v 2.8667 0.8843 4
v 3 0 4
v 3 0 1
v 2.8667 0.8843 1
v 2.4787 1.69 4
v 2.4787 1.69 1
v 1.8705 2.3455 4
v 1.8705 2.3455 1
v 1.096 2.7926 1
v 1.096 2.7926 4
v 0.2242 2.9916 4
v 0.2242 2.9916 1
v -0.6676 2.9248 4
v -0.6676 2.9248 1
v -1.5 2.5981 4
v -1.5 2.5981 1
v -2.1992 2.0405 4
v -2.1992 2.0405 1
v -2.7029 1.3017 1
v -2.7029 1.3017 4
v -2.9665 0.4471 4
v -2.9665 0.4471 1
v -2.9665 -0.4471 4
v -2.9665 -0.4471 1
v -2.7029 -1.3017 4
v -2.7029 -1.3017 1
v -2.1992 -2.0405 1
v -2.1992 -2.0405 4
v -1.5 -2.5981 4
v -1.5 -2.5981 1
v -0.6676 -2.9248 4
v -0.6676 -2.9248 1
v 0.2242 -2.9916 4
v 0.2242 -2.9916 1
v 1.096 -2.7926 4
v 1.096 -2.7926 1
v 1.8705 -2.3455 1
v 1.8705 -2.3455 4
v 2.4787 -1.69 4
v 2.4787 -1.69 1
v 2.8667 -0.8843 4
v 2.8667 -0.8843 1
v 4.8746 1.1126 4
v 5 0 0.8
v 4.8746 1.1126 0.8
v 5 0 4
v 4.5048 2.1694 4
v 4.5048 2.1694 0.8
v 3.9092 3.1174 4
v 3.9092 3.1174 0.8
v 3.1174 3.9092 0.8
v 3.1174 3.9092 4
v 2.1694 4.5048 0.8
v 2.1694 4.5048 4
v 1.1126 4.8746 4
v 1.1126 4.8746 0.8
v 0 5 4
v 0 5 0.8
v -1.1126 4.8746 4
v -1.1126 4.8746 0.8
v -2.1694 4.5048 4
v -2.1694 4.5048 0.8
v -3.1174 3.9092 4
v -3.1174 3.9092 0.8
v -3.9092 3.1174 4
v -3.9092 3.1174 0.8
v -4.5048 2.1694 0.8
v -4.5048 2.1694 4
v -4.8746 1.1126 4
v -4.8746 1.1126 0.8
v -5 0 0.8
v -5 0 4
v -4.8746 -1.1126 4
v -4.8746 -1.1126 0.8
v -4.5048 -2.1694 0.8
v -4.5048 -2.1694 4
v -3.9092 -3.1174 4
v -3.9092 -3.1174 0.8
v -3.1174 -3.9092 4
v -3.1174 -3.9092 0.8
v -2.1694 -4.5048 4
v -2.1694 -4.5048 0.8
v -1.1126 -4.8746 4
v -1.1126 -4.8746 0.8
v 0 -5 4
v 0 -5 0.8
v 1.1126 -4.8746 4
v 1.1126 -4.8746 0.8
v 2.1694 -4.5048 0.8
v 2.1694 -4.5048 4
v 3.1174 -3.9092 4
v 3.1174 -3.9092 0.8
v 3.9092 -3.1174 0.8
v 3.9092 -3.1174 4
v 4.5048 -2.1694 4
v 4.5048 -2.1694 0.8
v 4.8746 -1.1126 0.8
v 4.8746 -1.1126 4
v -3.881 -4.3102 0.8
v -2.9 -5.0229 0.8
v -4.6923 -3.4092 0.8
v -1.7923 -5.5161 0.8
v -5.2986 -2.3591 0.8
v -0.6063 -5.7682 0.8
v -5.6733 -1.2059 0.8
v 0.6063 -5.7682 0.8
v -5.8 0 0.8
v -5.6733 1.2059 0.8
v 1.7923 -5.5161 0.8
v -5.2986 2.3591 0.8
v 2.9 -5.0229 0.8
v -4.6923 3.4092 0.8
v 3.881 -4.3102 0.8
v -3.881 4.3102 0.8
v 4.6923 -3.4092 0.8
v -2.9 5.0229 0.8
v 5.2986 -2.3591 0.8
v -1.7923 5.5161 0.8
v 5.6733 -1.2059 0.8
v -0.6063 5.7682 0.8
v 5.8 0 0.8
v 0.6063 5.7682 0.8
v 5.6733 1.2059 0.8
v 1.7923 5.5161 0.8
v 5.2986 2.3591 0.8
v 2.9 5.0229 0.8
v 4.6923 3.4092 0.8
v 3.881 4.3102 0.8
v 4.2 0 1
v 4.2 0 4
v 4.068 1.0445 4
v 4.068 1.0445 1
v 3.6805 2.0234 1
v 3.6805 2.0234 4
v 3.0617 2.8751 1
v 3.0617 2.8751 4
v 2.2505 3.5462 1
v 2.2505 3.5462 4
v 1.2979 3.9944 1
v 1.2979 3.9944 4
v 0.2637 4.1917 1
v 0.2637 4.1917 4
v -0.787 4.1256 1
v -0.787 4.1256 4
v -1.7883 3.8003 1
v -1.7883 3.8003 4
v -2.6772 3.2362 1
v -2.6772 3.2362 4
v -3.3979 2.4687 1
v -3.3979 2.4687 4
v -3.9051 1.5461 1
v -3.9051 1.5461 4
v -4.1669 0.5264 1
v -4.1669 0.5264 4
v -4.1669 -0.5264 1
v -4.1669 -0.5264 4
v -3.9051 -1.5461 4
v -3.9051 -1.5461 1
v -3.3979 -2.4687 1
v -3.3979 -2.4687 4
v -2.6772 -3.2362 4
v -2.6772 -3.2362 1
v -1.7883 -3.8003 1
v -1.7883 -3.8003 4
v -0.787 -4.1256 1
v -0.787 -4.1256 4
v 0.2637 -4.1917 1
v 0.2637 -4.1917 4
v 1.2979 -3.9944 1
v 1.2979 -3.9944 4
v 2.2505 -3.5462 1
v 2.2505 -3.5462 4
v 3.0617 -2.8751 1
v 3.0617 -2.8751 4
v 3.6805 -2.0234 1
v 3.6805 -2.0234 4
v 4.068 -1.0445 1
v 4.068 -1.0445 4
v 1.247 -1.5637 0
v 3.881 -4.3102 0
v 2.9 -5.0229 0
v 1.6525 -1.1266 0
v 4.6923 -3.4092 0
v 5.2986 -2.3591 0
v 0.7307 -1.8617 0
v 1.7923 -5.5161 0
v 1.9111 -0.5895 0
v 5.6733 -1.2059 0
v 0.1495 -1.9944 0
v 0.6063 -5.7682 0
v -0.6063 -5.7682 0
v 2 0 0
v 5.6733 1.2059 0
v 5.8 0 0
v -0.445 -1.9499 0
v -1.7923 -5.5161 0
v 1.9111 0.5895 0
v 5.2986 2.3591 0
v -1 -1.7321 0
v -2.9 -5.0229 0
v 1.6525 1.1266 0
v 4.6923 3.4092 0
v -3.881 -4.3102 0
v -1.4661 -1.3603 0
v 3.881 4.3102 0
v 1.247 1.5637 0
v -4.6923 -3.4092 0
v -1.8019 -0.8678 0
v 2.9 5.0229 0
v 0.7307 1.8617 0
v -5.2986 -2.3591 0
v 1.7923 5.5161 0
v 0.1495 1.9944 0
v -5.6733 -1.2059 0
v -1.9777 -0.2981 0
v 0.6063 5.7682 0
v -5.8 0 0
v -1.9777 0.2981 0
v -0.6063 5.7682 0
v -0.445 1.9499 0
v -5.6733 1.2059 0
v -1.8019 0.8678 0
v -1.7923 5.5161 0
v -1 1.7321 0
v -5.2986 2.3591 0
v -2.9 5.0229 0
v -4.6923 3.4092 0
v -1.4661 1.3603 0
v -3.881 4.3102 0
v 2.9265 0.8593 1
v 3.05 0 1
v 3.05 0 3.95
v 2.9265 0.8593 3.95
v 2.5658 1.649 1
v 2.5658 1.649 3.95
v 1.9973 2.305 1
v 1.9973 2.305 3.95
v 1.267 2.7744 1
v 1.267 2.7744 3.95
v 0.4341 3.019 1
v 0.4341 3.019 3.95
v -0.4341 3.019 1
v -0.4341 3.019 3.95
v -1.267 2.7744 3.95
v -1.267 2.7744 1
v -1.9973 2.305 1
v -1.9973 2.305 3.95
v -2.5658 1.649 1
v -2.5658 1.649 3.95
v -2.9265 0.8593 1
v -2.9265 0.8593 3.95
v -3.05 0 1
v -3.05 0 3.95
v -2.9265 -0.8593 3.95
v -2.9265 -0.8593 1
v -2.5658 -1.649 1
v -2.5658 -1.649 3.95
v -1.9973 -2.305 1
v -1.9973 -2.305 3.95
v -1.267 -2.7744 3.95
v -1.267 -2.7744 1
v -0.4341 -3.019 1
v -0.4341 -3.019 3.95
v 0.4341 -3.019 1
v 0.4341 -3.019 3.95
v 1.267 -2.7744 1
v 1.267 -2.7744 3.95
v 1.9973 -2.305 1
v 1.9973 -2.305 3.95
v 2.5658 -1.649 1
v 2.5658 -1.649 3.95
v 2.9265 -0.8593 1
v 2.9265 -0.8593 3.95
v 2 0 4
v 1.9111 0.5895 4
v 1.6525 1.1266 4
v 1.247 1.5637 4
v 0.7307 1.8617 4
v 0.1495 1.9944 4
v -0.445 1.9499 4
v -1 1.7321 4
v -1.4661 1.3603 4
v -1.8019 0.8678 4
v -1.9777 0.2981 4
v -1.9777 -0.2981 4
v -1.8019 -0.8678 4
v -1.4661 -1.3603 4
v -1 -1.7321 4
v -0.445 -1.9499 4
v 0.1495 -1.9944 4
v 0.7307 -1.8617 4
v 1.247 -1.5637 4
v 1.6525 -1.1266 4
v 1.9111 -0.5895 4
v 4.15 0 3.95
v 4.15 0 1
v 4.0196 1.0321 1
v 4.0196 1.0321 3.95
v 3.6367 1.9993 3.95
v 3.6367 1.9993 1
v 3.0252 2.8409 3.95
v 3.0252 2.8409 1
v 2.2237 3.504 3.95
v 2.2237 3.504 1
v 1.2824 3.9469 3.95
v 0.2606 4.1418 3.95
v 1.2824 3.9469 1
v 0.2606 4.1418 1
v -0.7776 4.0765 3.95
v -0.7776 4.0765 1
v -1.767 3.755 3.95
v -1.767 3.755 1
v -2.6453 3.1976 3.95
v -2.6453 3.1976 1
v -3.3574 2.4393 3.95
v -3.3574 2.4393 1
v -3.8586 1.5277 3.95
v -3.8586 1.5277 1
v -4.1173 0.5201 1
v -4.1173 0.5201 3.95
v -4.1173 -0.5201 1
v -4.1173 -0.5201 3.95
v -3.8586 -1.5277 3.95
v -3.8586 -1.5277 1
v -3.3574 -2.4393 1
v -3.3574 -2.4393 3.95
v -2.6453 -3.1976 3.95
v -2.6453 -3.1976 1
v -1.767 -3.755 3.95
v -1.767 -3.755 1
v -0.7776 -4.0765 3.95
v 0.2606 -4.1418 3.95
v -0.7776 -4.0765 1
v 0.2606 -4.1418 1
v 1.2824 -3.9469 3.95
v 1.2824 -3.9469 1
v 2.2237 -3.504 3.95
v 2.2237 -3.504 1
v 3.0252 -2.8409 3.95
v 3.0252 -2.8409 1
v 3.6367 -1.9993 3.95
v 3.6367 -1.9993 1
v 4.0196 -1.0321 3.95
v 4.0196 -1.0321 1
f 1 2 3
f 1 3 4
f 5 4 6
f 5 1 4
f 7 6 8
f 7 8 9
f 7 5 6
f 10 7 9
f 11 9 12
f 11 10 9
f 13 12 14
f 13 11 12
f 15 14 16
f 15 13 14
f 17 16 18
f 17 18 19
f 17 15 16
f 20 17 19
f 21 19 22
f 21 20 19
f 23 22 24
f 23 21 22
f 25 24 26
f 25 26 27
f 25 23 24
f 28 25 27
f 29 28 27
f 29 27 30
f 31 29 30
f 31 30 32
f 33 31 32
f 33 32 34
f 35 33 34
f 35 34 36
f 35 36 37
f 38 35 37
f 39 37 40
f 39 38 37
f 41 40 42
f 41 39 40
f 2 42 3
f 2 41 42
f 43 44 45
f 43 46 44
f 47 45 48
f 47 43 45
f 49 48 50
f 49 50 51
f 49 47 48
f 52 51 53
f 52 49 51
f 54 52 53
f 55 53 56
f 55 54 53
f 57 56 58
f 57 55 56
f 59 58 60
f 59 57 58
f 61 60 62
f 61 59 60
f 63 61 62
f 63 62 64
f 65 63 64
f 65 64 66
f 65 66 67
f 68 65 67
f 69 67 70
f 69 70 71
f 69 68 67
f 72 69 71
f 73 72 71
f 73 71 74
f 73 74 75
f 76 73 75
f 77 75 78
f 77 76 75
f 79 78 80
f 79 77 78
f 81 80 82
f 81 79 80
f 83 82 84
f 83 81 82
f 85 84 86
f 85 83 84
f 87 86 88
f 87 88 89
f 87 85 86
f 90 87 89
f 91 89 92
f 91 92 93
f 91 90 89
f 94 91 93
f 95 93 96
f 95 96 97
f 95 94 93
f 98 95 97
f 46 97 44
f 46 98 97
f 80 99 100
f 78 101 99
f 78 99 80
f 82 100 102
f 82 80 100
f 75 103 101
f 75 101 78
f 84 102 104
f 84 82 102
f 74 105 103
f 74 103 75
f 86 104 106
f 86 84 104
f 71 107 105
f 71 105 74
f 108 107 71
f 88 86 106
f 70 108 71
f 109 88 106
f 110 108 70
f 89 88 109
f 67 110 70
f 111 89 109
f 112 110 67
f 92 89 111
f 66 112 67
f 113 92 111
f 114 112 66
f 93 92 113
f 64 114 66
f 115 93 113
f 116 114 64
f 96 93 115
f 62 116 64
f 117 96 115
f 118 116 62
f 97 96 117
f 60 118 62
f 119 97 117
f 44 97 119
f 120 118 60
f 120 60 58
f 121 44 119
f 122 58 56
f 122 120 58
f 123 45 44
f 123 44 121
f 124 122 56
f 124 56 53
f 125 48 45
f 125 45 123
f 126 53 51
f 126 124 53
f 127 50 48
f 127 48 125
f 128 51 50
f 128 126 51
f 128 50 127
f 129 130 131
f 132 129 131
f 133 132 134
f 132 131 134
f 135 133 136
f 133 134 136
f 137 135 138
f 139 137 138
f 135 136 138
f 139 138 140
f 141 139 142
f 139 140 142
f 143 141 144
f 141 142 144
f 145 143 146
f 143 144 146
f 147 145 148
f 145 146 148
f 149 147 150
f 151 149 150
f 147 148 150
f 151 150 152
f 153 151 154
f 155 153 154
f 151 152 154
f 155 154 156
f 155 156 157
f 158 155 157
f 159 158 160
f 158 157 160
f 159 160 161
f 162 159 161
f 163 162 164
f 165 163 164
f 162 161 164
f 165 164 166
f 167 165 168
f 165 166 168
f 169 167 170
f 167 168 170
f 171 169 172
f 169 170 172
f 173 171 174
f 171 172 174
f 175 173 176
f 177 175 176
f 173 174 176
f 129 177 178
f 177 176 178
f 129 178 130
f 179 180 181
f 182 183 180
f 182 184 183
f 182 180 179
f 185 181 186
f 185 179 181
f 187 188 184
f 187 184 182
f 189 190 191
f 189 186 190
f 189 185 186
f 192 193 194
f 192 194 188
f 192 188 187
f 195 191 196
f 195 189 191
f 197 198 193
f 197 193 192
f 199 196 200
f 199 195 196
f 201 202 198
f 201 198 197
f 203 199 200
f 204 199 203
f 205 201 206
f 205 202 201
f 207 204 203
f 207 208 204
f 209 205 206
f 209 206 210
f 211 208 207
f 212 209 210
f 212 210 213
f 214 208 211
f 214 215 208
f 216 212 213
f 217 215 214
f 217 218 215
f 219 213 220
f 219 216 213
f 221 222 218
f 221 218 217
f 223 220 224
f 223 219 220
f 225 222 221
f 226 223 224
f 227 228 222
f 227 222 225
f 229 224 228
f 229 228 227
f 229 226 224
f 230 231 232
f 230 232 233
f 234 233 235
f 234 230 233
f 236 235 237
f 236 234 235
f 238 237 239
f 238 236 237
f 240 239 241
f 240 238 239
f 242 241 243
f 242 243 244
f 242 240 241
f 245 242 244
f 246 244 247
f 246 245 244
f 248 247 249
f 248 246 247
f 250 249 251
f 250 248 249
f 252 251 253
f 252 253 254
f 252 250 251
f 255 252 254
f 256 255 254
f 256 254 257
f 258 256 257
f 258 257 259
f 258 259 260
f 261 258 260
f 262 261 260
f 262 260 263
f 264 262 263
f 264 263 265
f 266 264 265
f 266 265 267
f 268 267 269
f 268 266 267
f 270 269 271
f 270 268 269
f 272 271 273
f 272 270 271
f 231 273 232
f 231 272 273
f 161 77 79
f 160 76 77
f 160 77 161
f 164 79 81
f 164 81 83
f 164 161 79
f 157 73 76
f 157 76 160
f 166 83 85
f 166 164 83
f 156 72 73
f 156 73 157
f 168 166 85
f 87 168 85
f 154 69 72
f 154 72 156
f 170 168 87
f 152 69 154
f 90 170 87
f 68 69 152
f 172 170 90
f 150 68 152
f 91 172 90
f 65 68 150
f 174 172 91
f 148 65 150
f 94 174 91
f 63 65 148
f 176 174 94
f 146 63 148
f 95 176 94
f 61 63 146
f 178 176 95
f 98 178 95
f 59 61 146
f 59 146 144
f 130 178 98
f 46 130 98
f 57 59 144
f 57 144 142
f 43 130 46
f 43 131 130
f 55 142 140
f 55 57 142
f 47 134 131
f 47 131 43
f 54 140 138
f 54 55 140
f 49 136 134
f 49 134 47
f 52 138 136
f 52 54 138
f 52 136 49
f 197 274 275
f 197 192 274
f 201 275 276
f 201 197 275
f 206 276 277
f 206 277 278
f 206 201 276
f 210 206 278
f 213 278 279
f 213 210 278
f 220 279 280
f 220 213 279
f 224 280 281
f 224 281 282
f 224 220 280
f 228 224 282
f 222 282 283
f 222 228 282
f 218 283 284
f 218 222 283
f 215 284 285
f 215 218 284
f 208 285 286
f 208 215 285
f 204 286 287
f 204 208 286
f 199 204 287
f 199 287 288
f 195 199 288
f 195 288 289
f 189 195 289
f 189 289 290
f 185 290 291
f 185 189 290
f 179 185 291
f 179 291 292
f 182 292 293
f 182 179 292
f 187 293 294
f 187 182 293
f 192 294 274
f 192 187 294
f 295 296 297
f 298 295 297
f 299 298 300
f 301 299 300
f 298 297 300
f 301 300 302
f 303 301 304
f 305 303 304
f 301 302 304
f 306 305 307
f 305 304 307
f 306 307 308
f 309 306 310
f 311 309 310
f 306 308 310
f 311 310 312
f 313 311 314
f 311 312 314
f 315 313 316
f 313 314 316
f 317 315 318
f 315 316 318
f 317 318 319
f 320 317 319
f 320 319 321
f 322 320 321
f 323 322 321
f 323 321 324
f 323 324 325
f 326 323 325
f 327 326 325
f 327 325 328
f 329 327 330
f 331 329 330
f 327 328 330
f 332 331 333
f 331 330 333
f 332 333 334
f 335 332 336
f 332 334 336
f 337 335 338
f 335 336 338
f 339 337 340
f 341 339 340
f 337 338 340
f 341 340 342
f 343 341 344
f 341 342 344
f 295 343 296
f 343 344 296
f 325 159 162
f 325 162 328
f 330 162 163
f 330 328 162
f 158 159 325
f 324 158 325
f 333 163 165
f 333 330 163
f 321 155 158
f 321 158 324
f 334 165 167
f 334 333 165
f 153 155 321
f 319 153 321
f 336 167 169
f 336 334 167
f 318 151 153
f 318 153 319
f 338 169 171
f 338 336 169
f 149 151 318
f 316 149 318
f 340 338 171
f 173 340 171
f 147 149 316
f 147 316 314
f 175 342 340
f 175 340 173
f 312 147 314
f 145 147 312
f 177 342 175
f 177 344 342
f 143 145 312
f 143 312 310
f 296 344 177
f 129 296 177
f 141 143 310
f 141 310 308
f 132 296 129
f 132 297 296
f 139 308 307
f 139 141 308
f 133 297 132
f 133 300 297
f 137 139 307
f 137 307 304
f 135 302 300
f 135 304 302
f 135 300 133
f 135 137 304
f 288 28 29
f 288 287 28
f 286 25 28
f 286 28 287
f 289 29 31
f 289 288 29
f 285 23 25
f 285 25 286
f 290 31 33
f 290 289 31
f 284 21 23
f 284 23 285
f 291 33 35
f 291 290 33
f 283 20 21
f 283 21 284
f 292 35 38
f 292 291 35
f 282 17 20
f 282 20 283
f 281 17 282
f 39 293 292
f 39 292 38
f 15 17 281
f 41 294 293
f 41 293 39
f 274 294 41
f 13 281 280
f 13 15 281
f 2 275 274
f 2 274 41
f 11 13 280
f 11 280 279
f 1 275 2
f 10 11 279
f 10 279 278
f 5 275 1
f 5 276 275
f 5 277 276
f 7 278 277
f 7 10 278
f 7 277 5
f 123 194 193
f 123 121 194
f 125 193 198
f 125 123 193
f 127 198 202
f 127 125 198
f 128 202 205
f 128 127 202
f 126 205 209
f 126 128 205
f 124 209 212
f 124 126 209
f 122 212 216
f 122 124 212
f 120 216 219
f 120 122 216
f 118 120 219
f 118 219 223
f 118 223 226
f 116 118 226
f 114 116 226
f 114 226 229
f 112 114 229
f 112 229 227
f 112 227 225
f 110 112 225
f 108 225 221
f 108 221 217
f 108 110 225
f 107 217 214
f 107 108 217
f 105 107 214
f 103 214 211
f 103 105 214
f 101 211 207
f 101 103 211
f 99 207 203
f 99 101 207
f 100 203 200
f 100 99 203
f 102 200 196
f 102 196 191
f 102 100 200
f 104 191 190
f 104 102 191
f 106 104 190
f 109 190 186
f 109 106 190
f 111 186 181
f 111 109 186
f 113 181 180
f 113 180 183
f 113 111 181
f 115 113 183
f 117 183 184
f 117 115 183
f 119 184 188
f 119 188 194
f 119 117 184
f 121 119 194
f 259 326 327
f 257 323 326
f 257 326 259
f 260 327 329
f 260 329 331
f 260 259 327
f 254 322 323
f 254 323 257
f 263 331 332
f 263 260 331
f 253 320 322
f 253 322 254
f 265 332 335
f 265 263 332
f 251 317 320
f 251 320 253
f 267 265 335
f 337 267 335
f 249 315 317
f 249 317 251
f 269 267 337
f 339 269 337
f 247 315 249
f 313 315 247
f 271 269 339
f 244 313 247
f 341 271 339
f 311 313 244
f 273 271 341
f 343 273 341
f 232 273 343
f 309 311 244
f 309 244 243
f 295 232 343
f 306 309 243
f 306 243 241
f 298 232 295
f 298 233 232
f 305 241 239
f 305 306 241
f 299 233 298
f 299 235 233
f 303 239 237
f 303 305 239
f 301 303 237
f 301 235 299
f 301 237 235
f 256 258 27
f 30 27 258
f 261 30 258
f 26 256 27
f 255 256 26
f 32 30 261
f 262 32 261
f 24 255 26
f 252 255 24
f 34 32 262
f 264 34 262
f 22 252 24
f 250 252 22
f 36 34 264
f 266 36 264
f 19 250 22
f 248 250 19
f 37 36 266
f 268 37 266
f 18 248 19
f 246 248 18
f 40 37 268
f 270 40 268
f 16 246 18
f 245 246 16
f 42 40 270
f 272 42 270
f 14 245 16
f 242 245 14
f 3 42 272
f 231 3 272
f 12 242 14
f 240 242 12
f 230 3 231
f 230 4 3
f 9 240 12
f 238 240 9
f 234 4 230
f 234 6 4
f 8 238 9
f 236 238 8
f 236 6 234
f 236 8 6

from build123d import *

# Parameters (mm, degrees)
F2_R     = 4.2
F2_R_2   = 3
F3_DEPTH = 3
F4_R     = 4.15
F4_R_2   = 3.05
F5_DEPTH = 2.95


with BuildPart() as f1:
    # F0 (on Front) → F1 (revolve)
    with BuildSketch(Plane.XZ):
        Polygon((2, 4), (2, 0), (5.8, 0), (5.8, 0.8), (5, 0.8), (5, 4), align=None)
    revolve(axis=Axis((0, 0, 2), (0, 0, 1)))

    # F2 (on face) → F3 (cut)
    with BuildSketch(Plane.XY.offset(4)):
        Circle(F2_R)
        Circle(F2_R_2, mode=Mode.SUBTRACT)
    extrude(amount=-F3_DEPTH, mode=Mode.SUBTRACT)

    # F4 (on face) → F5 (join)
    with BuildSketch(Plane.XY.offset(1)):
        Circle(F4_R)
        Circle(F4_R_2, mode=Mode.SUBTRACT)
    extrude(amount=F5_DEPTH)


solid = f1.part
